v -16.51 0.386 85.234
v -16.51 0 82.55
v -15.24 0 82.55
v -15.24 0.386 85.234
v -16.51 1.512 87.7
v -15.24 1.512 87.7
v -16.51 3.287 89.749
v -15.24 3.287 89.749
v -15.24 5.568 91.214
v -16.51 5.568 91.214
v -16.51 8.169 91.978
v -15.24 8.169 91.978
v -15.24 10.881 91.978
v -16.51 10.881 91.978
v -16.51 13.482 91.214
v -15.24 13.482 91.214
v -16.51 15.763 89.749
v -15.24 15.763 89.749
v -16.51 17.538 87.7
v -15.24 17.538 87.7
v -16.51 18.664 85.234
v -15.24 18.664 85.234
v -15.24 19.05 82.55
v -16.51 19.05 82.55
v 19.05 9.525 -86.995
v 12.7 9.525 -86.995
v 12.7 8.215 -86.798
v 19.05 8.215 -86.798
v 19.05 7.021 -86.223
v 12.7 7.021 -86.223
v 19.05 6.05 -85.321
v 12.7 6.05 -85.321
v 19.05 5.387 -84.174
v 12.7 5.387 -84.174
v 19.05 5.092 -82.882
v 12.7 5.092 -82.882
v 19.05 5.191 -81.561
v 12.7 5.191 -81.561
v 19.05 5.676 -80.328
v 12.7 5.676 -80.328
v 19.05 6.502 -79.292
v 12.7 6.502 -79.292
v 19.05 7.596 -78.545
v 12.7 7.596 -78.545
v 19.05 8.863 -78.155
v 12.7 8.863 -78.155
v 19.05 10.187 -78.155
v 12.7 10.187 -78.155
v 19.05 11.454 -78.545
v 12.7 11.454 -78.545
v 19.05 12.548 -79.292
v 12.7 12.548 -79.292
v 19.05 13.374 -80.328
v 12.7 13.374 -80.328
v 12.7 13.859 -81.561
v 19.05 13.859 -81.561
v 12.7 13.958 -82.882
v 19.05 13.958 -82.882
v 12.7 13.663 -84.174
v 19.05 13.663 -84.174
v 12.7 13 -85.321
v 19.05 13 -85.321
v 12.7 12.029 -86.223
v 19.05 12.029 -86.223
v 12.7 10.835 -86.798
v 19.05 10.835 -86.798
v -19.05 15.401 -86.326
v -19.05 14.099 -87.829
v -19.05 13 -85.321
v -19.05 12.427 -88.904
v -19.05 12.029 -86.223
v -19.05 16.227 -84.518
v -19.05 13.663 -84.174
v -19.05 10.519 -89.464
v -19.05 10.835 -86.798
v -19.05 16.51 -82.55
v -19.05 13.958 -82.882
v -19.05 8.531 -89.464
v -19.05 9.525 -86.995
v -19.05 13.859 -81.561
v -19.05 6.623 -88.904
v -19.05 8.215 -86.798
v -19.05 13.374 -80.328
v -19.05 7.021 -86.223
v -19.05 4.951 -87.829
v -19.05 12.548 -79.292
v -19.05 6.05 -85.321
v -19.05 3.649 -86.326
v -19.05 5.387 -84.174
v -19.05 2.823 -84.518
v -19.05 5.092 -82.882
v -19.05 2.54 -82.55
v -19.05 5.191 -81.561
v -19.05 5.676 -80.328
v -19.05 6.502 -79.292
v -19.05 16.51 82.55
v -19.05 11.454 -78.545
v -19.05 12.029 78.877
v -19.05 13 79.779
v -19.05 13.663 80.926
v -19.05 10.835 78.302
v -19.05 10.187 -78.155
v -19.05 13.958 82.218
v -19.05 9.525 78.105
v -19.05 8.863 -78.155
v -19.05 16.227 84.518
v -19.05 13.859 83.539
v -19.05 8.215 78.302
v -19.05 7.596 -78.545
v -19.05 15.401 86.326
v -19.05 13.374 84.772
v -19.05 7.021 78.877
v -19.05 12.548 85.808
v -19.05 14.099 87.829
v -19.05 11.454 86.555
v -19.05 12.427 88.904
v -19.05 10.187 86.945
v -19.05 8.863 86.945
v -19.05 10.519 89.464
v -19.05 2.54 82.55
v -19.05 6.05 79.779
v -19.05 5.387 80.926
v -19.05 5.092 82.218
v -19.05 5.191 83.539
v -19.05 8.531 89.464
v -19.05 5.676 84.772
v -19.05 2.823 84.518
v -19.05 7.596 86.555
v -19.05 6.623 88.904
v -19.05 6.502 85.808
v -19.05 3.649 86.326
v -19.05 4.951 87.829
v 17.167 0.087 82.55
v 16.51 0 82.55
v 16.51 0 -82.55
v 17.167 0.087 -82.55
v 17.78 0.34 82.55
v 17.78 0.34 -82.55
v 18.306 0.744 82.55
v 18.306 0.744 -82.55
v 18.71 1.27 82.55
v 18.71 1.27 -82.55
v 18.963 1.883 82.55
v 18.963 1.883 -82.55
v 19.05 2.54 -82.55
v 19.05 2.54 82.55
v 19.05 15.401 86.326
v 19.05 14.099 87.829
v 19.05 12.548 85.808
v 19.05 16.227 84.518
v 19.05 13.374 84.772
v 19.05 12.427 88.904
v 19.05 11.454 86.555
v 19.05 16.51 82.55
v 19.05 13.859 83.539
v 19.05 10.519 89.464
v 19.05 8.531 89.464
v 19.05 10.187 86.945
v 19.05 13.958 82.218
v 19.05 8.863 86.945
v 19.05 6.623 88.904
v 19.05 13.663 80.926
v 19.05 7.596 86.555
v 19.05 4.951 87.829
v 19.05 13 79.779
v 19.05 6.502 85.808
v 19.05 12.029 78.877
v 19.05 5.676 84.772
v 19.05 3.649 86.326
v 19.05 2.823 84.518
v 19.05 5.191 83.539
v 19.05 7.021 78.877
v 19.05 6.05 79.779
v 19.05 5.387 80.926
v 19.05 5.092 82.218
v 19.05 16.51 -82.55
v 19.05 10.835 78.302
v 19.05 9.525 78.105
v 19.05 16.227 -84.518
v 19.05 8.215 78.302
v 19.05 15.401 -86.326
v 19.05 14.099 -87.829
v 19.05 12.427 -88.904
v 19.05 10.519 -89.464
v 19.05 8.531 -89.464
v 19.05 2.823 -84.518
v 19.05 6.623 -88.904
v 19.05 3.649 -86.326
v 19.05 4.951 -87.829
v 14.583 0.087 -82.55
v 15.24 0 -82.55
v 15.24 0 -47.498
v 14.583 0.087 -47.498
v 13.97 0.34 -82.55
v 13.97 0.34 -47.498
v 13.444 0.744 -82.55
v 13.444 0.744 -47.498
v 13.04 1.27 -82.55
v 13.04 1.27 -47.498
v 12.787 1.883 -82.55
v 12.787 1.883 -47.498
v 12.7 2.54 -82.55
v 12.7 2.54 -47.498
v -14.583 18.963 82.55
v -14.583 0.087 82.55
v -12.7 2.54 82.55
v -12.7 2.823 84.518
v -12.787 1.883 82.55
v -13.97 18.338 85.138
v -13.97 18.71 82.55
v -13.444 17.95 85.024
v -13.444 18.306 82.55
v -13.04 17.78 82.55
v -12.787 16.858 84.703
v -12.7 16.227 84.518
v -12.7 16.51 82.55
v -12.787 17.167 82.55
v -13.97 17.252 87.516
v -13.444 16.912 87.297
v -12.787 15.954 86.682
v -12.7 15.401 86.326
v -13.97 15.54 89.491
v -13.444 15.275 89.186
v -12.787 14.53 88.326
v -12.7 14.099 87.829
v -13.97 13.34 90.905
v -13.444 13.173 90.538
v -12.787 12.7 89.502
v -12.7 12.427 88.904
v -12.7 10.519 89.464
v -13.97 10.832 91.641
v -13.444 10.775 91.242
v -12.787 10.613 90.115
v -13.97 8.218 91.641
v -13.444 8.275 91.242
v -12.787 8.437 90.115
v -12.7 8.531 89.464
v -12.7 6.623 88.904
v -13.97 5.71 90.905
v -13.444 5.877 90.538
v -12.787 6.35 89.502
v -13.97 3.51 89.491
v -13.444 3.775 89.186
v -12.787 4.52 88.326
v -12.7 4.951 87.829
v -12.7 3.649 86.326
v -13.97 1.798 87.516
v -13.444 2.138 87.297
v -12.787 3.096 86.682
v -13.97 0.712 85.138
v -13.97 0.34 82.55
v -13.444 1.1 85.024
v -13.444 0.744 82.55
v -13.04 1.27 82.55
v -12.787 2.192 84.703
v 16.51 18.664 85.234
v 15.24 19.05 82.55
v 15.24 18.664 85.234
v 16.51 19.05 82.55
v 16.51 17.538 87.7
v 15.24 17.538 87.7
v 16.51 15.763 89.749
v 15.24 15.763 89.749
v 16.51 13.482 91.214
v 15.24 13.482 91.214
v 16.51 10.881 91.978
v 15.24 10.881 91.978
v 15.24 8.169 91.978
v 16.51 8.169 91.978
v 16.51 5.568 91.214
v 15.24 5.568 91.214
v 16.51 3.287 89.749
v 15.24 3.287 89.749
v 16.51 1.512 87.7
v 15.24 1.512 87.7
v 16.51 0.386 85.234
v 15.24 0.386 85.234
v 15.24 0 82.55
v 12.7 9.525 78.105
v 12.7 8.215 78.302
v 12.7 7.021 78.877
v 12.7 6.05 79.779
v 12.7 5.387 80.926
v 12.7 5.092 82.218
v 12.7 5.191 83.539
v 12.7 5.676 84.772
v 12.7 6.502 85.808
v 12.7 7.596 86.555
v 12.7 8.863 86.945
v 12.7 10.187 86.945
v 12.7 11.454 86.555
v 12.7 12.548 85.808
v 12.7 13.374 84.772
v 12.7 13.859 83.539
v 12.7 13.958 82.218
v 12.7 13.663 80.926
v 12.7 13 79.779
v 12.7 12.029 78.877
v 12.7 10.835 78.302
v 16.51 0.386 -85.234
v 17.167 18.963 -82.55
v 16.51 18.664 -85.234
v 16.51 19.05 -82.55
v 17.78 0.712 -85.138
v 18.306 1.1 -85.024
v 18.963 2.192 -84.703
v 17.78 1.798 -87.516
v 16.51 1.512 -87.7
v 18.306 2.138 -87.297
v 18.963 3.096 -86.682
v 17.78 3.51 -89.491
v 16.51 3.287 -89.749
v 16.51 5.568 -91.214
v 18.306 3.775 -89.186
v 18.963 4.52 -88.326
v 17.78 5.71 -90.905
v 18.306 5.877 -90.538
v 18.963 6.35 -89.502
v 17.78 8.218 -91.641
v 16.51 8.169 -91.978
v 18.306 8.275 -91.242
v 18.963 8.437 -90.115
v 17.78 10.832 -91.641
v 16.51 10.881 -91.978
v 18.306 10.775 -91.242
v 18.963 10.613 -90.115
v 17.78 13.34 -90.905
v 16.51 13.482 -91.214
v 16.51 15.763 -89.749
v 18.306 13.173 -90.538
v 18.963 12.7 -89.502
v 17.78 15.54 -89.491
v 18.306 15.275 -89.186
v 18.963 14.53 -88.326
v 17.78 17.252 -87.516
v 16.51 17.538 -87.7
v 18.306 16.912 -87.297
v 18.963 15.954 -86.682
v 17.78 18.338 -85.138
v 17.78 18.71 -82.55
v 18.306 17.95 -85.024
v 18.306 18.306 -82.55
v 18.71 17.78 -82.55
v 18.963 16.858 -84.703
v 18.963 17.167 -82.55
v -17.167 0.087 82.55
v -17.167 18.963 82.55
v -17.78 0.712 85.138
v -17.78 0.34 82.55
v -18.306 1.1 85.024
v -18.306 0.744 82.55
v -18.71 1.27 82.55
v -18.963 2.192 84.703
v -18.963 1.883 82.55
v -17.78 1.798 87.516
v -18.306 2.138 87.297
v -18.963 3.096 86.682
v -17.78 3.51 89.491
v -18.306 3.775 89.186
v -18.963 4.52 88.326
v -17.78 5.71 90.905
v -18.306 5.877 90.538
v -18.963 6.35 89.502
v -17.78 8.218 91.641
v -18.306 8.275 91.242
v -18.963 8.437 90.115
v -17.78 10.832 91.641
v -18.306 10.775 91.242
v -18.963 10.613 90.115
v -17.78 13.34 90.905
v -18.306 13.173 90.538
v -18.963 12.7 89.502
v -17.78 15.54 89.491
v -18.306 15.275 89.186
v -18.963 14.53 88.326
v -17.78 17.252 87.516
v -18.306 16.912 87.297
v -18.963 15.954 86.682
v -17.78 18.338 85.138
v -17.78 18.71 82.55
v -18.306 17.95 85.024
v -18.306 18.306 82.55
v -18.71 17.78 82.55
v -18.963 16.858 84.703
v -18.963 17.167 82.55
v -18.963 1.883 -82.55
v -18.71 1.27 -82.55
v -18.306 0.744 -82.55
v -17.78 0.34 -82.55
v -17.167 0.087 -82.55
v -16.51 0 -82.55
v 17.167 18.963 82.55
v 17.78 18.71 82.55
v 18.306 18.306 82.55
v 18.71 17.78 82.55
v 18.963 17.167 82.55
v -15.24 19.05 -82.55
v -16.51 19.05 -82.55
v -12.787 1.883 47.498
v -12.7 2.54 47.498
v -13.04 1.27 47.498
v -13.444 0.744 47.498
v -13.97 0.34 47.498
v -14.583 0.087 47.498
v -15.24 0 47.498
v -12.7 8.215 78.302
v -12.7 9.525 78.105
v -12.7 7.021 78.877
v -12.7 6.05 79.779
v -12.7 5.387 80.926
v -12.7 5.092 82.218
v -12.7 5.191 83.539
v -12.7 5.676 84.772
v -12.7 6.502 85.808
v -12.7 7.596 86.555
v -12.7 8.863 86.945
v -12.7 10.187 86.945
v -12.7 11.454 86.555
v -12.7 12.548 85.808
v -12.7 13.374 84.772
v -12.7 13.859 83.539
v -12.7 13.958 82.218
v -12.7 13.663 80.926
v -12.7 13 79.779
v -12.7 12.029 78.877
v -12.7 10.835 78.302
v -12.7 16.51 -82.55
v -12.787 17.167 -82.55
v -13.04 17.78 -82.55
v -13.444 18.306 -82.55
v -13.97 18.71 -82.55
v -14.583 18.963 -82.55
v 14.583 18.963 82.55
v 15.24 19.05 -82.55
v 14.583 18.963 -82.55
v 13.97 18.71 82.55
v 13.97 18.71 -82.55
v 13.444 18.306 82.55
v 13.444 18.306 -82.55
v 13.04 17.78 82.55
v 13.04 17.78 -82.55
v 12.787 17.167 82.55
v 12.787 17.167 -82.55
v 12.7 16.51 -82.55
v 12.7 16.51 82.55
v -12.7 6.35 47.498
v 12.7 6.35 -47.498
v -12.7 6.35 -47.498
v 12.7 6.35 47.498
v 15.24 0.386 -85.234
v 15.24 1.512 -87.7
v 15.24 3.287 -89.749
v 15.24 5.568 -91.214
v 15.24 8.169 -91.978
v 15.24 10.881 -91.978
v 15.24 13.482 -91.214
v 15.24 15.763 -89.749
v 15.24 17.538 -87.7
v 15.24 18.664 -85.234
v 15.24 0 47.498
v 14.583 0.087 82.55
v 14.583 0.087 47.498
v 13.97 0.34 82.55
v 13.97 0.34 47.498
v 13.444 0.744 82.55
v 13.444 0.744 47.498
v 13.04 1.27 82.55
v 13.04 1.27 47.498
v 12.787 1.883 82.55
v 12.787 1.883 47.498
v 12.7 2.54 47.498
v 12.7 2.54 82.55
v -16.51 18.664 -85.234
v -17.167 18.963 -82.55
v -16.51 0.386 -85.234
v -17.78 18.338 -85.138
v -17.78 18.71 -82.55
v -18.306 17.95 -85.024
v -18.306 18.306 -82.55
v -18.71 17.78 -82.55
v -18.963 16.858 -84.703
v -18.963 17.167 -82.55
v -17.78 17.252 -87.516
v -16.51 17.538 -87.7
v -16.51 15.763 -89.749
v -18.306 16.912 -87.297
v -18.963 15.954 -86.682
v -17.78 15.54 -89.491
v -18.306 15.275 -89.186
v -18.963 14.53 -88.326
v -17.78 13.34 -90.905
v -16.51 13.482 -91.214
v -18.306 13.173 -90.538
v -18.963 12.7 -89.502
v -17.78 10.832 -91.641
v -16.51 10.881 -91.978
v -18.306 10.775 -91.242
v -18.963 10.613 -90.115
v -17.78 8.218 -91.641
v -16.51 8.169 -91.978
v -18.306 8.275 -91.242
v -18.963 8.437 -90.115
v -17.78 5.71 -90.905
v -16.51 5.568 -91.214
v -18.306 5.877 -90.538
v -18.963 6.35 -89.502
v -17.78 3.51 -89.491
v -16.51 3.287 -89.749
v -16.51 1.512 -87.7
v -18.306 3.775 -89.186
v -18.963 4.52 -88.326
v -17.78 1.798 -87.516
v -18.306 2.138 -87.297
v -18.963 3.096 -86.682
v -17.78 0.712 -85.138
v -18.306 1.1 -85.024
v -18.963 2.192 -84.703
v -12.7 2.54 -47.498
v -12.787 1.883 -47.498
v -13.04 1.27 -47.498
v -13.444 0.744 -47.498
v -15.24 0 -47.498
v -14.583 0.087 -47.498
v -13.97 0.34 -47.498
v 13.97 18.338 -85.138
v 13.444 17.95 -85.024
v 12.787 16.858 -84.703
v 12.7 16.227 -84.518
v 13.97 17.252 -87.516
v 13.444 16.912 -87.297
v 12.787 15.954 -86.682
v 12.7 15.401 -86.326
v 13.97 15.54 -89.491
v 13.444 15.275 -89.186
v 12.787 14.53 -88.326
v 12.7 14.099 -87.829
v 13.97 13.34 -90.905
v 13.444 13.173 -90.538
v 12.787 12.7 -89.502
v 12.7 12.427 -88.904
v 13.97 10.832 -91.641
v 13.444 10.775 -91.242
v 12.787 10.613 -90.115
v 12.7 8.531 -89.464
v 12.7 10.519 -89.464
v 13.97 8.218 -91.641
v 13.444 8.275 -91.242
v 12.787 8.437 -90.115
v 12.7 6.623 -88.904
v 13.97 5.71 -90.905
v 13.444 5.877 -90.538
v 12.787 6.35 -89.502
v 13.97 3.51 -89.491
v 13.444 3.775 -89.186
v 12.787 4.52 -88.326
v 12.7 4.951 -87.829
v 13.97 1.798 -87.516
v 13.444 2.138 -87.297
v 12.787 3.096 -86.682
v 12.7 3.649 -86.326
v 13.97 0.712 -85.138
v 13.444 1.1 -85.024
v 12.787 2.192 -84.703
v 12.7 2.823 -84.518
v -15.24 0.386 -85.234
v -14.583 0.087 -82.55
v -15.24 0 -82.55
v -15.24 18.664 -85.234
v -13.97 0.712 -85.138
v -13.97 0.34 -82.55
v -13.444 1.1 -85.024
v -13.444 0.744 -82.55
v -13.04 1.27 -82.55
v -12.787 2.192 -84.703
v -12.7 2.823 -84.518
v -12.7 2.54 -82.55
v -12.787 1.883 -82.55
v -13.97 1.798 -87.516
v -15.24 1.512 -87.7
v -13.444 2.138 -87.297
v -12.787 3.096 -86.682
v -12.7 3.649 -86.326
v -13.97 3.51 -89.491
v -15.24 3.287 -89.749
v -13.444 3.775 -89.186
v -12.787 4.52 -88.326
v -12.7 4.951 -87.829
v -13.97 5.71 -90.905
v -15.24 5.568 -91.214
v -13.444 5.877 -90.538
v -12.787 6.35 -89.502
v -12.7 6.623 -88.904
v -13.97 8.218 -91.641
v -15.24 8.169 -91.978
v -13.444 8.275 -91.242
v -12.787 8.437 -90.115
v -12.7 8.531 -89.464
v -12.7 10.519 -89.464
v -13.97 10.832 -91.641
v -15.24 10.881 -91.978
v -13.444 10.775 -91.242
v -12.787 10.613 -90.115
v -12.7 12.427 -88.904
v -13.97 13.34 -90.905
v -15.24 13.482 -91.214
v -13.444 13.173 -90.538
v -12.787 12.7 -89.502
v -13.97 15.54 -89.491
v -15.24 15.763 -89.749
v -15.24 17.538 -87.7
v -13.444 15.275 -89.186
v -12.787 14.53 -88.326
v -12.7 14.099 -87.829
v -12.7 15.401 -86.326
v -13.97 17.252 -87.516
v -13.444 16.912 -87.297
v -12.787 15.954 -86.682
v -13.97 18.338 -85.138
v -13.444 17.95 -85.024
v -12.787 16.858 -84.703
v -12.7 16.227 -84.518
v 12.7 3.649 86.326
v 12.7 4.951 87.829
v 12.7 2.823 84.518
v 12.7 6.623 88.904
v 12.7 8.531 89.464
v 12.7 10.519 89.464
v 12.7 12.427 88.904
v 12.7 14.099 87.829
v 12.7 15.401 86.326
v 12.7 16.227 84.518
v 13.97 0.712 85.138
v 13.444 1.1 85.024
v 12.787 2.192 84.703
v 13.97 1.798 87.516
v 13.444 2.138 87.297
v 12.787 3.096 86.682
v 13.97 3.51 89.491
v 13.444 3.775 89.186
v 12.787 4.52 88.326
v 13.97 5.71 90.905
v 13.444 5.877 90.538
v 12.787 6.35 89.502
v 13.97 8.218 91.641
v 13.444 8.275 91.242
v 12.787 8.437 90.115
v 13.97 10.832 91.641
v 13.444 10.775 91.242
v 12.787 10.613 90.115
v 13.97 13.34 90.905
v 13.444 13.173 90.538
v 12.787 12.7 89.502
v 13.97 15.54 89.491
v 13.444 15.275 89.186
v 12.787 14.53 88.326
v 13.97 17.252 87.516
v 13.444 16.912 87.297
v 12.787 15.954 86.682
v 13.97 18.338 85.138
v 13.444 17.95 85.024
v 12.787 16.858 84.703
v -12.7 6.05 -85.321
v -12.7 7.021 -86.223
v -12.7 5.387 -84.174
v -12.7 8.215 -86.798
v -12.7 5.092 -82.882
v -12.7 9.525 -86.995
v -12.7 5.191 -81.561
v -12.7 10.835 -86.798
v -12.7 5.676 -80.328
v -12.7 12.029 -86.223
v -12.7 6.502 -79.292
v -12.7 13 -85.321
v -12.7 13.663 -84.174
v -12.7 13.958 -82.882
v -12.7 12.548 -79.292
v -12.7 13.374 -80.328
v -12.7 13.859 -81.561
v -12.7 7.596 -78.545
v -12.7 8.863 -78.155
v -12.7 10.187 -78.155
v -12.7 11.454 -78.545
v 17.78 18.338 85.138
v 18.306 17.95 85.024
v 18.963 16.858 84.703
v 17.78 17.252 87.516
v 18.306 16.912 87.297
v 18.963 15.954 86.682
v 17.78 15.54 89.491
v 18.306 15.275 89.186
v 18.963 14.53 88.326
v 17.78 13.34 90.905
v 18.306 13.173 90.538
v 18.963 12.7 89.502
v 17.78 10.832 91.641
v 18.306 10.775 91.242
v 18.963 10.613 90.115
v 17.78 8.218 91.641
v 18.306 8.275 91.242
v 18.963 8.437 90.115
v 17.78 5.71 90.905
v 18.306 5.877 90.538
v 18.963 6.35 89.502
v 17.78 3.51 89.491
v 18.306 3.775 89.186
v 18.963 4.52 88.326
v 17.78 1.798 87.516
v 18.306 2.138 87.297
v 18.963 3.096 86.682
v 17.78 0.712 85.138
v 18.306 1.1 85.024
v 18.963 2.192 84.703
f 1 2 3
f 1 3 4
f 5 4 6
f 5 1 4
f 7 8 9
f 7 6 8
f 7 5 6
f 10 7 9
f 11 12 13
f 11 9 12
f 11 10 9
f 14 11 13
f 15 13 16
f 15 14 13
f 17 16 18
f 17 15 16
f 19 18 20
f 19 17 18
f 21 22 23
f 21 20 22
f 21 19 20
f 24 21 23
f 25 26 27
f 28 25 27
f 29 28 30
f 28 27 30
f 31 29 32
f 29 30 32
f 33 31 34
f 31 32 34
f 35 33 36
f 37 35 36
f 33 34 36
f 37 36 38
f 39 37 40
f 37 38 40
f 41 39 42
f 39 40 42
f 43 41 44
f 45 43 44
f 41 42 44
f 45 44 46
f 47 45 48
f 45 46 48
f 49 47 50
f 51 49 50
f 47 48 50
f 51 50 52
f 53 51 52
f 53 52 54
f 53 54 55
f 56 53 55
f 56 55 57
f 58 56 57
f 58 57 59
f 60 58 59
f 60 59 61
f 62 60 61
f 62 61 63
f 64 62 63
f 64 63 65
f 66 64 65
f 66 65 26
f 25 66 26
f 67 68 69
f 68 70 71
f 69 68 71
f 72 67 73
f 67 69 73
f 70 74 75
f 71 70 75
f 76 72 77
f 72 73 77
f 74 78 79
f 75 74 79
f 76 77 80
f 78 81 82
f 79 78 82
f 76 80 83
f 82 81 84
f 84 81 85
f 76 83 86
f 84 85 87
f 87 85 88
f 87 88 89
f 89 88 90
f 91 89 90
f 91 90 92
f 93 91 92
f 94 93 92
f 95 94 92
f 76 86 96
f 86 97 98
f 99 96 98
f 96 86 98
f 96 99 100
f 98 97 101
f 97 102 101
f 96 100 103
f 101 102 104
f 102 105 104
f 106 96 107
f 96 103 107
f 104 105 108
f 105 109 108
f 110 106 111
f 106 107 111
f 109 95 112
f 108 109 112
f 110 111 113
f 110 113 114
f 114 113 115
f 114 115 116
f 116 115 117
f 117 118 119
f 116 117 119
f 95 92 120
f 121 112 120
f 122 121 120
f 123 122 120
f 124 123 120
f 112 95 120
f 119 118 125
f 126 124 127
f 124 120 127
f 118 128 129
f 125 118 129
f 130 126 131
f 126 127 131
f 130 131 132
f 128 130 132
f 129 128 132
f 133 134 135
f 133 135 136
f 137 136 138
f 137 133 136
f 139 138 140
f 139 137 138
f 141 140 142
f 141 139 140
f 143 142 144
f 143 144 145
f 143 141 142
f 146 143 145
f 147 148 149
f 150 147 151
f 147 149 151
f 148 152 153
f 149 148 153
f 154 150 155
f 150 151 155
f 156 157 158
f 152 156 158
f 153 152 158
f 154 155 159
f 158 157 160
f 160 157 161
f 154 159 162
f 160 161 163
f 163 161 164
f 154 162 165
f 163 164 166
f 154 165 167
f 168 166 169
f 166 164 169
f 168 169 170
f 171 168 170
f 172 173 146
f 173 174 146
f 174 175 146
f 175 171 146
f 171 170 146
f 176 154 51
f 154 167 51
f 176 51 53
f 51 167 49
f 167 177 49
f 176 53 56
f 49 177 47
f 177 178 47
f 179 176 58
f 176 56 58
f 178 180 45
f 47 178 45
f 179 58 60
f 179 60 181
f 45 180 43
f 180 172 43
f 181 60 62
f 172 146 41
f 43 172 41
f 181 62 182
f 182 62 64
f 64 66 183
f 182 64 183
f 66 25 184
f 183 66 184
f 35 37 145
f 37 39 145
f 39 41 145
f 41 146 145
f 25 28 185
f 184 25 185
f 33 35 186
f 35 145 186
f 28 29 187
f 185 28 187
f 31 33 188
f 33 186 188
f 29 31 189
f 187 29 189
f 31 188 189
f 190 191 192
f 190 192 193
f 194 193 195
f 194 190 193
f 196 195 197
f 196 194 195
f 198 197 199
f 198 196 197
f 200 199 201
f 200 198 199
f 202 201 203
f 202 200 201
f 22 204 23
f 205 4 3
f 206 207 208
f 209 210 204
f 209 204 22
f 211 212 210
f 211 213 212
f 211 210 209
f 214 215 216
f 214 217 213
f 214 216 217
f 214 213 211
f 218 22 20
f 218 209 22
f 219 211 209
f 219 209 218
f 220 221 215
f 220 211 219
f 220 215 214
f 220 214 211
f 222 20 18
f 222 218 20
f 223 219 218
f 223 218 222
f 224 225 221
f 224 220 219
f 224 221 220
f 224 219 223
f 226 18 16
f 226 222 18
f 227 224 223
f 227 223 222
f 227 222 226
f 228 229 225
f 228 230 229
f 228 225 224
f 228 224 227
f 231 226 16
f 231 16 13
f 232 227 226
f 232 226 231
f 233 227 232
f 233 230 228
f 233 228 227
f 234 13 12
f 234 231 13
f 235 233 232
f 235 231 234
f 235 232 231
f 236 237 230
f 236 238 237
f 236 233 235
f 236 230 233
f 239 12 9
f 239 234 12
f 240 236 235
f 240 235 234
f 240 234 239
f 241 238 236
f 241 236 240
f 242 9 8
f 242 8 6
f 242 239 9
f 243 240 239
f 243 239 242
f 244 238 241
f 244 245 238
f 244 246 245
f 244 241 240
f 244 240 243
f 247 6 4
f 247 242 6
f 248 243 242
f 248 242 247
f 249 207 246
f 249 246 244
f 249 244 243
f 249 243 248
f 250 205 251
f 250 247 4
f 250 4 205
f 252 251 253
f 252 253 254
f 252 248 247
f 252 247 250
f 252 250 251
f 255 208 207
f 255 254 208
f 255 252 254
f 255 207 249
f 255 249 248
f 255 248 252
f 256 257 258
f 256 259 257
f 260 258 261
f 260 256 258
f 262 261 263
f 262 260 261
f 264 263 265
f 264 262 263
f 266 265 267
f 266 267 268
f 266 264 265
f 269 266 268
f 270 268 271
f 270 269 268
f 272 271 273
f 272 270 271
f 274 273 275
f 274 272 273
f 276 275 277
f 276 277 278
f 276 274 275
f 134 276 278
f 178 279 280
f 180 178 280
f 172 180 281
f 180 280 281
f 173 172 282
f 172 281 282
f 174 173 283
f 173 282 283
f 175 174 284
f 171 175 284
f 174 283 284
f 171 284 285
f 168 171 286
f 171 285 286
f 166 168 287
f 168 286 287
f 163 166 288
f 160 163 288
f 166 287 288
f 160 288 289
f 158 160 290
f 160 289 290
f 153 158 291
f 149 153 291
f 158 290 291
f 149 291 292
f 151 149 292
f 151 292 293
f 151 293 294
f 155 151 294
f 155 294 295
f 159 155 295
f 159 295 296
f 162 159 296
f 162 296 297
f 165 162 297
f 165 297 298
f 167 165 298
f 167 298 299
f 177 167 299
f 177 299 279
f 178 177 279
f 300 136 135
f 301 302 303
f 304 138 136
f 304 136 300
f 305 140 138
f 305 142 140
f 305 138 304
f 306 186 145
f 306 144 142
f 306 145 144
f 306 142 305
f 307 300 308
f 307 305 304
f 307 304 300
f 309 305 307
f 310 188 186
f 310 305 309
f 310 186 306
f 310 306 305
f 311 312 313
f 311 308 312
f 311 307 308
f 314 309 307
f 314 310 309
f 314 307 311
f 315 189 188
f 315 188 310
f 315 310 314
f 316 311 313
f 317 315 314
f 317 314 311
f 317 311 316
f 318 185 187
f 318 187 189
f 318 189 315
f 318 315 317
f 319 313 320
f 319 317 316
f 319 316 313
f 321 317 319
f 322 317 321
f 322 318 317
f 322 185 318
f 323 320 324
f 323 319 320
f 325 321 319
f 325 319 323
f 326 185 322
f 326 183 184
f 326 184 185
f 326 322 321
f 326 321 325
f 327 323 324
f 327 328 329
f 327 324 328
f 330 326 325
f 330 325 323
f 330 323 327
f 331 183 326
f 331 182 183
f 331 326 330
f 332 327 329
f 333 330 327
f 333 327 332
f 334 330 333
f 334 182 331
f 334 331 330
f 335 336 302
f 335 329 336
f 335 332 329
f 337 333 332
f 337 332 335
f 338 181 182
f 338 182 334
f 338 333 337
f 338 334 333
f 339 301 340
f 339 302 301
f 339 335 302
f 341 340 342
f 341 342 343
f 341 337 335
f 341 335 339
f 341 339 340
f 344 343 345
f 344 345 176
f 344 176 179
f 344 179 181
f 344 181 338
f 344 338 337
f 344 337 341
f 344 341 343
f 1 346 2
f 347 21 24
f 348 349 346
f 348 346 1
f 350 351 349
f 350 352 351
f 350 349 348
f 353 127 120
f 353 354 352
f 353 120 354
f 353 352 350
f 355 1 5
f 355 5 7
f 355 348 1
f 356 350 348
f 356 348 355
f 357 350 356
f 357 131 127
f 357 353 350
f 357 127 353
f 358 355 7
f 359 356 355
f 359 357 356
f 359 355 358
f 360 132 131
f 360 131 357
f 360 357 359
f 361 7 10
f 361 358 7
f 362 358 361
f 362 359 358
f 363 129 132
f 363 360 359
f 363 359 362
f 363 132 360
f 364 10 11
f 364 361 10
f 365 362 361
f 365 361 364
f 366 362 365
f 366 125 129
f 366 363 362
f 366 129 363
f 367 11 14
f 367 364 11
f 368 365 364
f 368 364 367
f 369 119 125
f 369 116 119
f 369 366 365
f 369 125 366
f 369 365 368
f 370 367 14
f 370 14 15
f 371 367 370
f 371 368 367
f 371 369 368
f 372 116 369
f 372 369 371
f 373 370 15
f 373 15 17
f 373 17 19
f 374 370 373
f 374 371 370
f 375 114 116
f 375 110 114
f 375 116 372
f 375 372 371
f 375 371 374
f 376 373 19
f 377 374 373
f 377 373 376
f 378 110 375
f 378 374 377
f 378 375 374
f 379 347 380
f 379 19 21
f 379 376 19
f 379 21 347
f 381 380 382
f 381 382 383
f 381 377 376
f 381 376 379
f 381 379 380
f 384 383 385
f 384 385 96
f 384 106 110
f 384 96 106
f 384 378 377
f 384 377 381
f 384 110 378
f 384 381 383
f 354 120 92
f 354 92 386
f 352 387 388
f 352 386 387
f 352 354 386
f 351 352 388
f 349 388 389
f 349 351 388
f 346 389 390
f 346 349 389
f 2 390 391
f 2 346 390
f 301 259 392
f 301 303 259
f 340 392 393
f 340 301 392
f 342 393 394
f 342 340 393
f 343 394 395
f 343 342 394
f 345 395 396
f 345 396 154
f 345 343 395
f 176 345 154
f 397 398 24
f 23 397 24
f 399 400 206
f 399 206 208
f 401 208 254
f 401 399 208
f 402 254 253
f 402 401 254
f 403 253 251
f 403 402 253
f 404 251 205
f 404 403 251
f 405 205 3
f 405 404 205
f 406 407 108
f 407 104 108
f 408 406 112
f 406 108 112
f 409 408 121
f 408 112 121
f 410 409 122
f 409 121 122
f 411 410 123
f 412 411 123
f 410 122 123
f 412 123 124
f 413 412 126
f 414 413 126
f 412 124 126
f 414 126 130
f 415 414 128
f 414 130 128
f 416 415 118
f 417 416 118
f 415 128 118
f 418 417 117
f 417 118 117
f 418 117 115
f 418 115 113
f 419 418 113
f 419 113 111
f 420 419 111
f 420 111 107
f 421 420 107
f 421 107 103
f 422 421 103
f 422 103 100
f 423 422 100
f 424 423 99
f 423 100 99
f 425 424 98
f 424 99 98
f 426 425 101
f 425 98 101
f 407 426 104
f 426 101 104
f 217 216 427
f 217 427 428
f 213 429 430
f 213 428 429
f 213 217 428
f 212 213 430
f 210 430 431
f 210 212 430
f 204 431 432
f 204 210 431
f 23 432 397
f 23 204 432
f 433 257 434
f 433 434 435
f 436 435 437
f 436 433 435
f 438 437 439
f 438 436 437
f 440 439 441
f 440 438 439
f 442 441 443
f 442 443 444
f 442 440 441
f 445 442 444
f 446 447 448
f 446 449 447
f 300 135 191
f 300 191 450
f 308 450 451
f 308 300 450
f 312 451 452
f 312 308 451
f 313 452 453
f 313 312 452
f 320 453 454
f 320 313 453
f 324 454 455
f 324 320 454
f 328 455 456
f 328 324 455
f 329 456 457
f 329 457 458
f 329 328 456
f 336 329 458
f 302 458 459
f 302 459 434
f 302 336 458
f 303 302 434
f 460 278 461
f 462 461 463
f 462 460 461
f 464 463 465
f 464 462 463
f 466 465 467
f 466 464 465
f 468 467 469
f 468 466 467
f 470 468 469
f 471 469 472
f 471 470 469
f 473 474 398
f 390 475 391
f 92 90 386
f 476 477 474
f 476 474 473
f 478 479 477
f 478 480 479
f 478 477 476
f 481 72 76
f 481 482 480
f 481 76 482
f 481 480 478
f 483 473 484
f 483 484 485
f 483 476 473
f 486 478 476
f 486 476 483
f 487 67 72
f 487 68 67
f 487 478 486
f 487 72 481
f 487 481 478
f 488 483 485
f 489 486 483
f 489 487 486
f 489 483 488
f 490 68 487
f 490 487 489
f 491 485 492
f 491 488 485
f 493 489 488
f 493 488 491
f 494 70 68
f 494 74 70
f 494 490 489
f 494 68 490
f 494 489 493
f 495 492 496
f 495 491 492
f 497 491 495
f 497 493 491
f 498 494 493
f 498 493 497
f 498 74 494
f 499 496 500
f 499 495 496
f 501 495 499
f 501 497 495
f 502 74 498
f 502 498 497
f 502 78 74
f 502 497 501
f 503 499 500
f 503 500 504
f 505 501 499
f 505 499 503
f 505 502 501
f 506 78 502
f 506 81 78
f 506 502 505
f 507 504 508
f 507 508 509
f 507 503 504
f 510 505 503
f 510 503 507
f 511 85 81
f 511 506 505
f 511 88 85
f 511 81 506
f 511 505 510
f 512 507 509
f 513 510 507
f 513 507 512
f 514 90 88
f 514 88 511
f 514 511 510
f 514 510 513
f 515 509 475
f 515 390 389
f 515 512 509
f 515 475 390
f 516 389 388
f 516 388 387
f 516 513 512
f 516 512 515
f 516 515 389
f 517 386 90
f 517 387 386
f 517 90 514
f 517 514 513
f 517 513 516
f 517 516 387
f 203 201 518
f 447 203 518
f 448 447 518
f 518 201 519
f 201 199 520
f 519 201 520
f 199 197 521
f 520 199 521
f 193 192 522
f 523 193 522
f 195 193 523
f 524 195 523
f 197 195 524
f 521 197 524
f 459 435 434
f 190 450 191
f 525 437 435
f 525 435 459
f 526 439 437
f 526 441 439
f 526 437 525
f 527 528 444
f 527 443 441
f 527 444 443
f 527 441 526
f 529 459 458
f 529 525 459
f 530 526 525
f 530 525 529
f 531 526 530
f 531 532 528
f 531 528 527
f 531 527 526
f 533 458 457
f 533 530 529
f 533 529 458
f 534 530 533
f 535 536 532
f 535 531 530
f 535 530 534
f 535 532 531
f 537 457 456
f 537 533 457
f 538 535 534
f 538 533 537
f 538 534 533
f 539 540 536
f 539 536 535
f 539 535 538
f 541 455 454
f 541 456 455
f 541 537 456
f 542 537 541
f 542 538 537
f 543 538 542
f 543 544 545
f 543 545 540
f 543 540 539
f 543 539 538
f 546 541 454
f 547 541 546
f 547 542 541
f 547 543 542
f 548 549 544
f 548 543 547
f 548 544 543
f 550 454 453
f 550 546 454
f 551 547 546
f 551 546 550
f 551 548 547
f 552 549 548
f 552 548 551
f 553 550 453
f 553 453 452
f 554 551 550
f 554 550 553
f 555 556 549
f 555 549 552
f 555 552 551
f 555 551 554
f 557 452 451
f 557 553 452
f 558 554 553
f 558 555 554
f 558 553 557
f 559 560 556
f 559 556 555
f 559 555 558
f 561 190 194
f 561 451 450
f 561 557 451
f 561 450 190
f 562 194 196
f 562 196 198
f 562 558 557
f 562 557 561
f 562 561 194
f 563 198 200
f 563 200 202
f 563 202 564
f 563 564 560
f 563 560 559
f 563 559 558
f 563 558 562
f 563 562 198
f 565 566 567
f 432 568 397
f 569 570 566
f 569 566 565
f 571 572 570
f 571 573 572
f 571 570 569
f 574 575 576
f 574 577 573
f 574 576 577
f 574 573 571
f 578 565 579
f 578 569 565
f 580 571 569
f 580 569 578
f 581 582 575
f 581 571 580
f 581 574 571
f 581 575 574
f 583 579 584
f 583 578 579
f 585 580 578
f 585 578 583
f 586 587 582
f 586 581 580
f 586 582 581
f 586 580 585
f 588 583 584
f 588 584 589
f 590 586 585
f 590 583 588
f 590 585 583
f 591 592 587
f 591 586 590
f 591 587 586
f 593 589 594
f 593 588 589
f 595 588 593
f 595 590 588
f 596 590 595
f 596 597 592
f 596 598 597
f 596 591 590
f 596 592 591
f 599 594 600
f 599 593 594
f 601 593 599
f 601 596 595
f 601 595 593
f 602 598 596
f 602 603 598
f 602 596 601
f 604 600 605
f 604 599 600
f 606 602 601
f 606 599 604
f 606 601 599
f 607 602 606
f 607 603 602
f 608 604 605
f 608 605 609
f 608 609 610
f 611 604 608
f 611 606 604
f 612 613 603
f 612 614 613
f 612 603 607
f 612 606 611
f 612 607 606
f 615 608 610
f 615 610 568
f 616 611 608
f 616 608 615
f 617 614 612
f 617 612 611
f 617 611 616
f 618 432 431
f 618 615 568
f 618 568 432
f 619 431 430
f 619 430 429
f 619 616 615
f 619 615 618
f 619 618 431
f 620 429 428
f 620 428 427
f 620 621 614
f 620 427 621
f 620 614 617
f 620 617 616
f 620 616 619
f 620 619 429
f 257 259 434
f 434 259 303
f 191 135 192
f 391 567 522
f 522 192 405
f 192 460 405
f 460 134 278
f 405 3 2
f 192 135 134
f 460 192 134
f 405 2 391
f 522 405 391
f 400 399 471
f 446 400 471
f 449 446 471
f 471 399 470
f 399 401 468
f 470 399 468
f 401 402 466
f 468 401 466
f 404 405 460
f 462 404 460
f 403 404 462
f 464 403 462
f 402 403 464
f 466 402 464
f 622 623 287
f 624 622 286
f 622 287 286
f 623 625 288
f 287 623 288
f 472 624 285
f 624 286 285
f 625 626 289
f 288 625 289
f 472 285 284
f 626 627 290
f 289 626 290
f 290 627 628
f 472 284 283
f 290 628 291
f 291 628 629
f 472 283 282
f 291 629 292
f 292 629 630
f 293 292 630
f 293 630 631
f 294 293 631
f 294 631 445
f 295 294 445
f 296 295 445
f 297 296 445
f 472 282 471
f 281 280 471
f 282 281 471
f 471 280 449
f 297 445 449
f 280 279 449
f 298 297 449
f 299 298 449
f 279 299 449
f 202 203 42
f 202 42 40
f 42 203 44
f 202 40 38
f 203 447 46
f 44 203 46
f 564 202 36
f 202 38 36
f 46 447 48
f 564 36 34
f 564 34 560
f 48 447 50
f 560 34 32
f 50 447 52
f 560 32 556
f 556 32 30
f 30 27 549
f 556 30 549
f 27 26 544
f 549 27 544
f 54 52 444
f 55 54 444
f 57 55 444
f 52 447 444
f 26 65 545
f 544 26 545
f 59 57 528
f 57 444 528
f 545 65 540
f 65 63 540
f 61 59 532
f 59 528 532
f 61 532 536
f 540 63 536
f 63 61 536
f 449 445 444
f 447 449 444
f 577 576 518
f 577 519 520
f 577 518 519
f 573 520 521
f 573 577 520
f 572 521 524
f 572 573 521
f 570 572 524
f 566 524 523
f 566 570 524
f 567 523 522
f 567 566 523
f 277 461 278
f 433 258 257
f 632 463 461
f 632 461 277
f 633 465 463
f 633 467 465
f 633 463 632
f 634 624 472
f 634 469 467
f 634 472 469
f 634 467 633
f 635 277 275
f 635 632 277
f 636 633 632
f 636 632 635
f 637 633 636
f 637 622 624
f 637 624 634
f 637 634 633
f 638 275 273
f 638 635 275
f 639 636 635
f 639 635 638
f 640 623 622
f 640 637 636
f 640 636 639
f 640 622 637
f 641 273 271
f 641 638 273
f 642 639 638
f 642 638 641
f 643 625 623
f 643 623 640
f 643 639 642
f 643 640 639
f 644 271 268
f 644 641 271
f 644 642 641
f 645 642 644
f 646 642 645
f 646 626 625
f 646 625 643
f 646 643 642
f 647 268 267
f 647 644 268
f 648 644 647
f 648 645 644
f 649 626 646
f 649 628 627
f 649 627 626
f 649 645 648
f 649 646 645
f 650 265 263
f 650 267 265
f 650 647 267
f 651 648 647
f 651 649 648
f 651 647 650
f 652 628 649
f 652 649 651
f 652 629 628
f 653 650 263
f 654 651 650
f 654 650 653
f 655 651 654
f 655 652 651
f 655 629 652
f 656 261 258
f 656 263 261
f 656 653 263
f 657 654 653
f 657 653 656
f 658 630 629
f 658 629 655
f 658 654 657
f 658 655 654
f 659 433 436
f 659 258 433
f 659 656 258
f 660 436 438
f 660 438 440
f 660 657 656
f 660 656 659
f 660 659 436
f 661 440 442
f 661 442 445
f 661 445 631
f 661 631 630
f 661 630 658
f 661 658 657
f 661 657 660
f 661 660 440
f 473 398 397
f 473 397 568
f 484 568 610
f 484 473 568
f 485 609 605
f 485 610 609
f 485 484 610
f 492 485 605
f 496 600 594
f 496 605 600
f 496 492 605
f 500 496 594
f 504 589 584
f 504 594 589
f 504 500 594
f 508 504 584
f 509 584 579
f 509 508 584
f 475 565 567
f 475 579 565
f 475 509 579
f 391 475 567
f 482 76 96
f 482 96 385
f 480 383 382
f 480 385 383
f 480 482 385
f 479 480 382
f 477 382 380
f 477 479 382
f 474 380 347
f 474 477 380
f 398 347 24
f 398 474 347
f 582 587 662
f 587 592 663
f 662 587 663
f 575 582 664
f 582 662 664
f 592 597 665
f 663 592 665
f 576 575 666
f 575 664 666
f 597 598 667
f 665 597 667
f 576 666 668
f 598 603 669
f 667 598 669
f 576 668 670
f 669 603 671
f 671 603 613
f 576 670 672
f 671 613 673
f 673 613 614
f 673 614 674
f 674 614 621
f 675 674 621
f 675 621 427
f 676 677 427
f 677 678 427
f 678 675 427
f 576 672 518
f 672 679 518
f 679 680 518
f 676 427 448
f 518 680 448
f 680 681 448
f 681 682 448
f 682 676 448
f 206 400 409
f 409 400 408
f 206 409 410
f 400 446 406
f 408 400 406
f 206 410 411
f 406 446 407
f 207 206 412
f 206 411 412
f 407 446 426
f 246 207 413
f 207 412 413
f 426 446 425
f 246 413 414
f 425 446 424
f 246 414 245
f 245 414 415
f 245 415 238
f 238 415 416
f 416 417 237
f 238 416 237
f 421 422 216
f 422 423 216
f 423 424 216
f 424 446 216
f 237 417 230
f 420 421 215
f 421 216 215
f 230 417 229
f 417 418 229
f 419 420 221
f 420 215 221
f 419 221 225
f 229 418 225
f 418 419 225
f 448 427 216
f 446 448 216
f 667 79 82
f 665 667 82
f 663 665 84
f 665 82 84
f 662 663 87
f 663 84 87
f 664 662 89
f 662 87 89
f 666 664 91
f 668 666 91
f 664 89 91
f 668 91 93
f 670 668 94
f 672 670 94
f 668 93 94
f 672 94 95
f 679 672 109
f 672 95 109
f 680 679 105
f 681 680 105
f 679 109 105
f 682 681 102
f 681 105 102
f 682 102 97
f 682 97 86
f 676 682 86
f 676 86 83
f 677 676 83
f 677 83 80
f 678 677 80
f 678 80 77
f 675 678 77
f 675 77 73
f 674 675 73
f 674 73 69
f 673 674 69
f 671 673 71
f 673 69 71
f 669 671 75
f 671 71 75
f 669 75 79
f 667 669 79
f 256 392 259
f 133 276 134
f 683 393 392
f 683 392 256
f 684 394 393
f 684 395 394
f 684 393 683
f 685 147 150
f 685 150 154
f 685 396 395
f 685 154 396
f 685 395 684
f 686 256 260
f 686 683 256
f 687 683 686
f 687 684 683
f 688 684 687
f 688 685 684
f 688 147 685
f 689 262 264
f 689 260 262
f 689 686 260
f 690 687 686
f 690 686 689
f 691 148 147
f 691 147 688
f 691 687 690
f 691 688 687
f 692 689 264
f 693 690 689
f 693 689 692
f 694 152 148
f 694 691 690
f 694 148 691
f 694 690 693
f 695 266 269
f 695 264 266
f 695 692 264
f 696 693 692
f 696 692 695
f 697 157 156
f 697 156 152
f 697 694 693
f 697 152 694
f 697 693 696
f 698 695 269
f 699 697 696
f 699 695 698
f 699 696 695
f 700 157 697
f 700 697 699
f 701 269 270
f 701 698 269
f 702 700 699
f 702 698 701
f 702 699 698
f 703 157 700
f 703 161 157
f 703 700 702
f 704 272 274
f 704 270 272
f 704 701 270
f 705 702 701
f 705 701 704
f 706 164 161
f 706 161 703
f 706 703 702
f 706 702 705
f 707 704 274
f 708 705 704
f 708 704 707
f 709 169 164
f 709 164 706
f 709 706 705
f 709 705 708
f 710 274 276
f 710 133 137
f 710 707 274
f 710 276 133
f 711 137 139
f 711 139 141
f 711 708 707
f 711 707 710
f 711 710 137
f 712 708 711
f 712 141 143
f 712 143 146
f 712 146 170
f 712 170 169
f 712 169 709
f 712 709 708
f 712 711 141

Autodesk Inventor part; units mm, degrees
ref_plane "YZ Plane" through (0, 0, 0) normal (1, 0, 0) x (0, 1, 0)
ref_plane "XZ Plane" through (0, 0, 0) normal (0, 1, 0) x (-1, 0, 0)
ref_plane "XY Plane" through (0, 0, 0) normal (0, 0, 1) x (1, 0, 0)
sketch "Sketch1" plane through (0, 0, 0) normal (0, 1, 0) x (-1, 0, 0)
  line L0 (19.05, 47.498) -> (-19.05, 47.498)
  line L1 (-19.05, 47.498) -> (-19.05, -47.498)
  line L2 (-19.05, -47.498) -> (19.05, -47.498)
  line L3 (19.05, -47.498) -> (19.05, 47.498)
  line L4 (19.05, 47.498) -> (-19.05, -47.498) construction
  line L5 (-19.05, 47.498) -> (19.05, -47.498) construction
  point P0 (0, 0)
  dimension "d0" = 38.1
  dimension "d1" = 94.996
extrude "Extrusion1" add sketch "Sketch1" along normal blind 6.35
sketch "Sketch2" plane through (19.05, 0, 47.498) normal (1, 0, 0) x (0, 0, -1)
  line L0 (-35.052, 19.05) -> (130.048, 19.05)
  line L1 (130.048, 19.05) -> (130.048, 0)
  line L2 (130.048, 0) -> (-35.052, 0)
  line L3 (-35.052, 0) -> (-35.052, 19.05)
  line L4 (-35.052, 19.05) -> (130.048, 0) construction
  line L5 (130.048, 19.05) -> (-35.052, 0) construction
  line L6 (0, 0) -> (94.996, 0) projected
  circle A0 centre (-35.052, 9.525) radius 9.525
  circle A1 centre (130.048, 9.525) radius 9.525
  point P0 (47.498, 0)
  point P1 (47.498, 9.525)
  point P2 (47.498, 0)
  dimension "d4" = 165.1
  dimension "d5" = 19.05
extrude "Extrusion2" add sketch "Sketch2" against normal blind 6.35
fillet "Fillet1" radius 2.54 9 edges at (12.7, 0, -65.024) (12.7, 19.05, 0) (12.7, 9.525, 92.075) (12.7, 0, 65.024) (12.7, 9.525, -92.075) (19.05, 19.05, 0) (19.05, 9.525, 92.075) (19.05, 0, 0) (19.05, 9.525, -92.075)
mirror "Mirror1" about plane through (0, 0, 0) normal (1, 0, 0) of "Extrusion2", "Fillet1"
sketch "Sketch3" plane through (19.05, 9.525, 82.55) normal (1, 0, 0) x (0, 0, -1)
  arc A0 (165.1, -6.985) -> (165.1, 6.985) centre (165.1, 0) ccw projected
  point P0 (82.55, -9.525)
  point P1 (0, 0)
hole "Hole1" at (19.05, 9.525, 82.55) at (19.05, 9.525, -82.55) direction (-1, 0, 0) diameter 8.89 end through all
properties part number "Thin Leg"
